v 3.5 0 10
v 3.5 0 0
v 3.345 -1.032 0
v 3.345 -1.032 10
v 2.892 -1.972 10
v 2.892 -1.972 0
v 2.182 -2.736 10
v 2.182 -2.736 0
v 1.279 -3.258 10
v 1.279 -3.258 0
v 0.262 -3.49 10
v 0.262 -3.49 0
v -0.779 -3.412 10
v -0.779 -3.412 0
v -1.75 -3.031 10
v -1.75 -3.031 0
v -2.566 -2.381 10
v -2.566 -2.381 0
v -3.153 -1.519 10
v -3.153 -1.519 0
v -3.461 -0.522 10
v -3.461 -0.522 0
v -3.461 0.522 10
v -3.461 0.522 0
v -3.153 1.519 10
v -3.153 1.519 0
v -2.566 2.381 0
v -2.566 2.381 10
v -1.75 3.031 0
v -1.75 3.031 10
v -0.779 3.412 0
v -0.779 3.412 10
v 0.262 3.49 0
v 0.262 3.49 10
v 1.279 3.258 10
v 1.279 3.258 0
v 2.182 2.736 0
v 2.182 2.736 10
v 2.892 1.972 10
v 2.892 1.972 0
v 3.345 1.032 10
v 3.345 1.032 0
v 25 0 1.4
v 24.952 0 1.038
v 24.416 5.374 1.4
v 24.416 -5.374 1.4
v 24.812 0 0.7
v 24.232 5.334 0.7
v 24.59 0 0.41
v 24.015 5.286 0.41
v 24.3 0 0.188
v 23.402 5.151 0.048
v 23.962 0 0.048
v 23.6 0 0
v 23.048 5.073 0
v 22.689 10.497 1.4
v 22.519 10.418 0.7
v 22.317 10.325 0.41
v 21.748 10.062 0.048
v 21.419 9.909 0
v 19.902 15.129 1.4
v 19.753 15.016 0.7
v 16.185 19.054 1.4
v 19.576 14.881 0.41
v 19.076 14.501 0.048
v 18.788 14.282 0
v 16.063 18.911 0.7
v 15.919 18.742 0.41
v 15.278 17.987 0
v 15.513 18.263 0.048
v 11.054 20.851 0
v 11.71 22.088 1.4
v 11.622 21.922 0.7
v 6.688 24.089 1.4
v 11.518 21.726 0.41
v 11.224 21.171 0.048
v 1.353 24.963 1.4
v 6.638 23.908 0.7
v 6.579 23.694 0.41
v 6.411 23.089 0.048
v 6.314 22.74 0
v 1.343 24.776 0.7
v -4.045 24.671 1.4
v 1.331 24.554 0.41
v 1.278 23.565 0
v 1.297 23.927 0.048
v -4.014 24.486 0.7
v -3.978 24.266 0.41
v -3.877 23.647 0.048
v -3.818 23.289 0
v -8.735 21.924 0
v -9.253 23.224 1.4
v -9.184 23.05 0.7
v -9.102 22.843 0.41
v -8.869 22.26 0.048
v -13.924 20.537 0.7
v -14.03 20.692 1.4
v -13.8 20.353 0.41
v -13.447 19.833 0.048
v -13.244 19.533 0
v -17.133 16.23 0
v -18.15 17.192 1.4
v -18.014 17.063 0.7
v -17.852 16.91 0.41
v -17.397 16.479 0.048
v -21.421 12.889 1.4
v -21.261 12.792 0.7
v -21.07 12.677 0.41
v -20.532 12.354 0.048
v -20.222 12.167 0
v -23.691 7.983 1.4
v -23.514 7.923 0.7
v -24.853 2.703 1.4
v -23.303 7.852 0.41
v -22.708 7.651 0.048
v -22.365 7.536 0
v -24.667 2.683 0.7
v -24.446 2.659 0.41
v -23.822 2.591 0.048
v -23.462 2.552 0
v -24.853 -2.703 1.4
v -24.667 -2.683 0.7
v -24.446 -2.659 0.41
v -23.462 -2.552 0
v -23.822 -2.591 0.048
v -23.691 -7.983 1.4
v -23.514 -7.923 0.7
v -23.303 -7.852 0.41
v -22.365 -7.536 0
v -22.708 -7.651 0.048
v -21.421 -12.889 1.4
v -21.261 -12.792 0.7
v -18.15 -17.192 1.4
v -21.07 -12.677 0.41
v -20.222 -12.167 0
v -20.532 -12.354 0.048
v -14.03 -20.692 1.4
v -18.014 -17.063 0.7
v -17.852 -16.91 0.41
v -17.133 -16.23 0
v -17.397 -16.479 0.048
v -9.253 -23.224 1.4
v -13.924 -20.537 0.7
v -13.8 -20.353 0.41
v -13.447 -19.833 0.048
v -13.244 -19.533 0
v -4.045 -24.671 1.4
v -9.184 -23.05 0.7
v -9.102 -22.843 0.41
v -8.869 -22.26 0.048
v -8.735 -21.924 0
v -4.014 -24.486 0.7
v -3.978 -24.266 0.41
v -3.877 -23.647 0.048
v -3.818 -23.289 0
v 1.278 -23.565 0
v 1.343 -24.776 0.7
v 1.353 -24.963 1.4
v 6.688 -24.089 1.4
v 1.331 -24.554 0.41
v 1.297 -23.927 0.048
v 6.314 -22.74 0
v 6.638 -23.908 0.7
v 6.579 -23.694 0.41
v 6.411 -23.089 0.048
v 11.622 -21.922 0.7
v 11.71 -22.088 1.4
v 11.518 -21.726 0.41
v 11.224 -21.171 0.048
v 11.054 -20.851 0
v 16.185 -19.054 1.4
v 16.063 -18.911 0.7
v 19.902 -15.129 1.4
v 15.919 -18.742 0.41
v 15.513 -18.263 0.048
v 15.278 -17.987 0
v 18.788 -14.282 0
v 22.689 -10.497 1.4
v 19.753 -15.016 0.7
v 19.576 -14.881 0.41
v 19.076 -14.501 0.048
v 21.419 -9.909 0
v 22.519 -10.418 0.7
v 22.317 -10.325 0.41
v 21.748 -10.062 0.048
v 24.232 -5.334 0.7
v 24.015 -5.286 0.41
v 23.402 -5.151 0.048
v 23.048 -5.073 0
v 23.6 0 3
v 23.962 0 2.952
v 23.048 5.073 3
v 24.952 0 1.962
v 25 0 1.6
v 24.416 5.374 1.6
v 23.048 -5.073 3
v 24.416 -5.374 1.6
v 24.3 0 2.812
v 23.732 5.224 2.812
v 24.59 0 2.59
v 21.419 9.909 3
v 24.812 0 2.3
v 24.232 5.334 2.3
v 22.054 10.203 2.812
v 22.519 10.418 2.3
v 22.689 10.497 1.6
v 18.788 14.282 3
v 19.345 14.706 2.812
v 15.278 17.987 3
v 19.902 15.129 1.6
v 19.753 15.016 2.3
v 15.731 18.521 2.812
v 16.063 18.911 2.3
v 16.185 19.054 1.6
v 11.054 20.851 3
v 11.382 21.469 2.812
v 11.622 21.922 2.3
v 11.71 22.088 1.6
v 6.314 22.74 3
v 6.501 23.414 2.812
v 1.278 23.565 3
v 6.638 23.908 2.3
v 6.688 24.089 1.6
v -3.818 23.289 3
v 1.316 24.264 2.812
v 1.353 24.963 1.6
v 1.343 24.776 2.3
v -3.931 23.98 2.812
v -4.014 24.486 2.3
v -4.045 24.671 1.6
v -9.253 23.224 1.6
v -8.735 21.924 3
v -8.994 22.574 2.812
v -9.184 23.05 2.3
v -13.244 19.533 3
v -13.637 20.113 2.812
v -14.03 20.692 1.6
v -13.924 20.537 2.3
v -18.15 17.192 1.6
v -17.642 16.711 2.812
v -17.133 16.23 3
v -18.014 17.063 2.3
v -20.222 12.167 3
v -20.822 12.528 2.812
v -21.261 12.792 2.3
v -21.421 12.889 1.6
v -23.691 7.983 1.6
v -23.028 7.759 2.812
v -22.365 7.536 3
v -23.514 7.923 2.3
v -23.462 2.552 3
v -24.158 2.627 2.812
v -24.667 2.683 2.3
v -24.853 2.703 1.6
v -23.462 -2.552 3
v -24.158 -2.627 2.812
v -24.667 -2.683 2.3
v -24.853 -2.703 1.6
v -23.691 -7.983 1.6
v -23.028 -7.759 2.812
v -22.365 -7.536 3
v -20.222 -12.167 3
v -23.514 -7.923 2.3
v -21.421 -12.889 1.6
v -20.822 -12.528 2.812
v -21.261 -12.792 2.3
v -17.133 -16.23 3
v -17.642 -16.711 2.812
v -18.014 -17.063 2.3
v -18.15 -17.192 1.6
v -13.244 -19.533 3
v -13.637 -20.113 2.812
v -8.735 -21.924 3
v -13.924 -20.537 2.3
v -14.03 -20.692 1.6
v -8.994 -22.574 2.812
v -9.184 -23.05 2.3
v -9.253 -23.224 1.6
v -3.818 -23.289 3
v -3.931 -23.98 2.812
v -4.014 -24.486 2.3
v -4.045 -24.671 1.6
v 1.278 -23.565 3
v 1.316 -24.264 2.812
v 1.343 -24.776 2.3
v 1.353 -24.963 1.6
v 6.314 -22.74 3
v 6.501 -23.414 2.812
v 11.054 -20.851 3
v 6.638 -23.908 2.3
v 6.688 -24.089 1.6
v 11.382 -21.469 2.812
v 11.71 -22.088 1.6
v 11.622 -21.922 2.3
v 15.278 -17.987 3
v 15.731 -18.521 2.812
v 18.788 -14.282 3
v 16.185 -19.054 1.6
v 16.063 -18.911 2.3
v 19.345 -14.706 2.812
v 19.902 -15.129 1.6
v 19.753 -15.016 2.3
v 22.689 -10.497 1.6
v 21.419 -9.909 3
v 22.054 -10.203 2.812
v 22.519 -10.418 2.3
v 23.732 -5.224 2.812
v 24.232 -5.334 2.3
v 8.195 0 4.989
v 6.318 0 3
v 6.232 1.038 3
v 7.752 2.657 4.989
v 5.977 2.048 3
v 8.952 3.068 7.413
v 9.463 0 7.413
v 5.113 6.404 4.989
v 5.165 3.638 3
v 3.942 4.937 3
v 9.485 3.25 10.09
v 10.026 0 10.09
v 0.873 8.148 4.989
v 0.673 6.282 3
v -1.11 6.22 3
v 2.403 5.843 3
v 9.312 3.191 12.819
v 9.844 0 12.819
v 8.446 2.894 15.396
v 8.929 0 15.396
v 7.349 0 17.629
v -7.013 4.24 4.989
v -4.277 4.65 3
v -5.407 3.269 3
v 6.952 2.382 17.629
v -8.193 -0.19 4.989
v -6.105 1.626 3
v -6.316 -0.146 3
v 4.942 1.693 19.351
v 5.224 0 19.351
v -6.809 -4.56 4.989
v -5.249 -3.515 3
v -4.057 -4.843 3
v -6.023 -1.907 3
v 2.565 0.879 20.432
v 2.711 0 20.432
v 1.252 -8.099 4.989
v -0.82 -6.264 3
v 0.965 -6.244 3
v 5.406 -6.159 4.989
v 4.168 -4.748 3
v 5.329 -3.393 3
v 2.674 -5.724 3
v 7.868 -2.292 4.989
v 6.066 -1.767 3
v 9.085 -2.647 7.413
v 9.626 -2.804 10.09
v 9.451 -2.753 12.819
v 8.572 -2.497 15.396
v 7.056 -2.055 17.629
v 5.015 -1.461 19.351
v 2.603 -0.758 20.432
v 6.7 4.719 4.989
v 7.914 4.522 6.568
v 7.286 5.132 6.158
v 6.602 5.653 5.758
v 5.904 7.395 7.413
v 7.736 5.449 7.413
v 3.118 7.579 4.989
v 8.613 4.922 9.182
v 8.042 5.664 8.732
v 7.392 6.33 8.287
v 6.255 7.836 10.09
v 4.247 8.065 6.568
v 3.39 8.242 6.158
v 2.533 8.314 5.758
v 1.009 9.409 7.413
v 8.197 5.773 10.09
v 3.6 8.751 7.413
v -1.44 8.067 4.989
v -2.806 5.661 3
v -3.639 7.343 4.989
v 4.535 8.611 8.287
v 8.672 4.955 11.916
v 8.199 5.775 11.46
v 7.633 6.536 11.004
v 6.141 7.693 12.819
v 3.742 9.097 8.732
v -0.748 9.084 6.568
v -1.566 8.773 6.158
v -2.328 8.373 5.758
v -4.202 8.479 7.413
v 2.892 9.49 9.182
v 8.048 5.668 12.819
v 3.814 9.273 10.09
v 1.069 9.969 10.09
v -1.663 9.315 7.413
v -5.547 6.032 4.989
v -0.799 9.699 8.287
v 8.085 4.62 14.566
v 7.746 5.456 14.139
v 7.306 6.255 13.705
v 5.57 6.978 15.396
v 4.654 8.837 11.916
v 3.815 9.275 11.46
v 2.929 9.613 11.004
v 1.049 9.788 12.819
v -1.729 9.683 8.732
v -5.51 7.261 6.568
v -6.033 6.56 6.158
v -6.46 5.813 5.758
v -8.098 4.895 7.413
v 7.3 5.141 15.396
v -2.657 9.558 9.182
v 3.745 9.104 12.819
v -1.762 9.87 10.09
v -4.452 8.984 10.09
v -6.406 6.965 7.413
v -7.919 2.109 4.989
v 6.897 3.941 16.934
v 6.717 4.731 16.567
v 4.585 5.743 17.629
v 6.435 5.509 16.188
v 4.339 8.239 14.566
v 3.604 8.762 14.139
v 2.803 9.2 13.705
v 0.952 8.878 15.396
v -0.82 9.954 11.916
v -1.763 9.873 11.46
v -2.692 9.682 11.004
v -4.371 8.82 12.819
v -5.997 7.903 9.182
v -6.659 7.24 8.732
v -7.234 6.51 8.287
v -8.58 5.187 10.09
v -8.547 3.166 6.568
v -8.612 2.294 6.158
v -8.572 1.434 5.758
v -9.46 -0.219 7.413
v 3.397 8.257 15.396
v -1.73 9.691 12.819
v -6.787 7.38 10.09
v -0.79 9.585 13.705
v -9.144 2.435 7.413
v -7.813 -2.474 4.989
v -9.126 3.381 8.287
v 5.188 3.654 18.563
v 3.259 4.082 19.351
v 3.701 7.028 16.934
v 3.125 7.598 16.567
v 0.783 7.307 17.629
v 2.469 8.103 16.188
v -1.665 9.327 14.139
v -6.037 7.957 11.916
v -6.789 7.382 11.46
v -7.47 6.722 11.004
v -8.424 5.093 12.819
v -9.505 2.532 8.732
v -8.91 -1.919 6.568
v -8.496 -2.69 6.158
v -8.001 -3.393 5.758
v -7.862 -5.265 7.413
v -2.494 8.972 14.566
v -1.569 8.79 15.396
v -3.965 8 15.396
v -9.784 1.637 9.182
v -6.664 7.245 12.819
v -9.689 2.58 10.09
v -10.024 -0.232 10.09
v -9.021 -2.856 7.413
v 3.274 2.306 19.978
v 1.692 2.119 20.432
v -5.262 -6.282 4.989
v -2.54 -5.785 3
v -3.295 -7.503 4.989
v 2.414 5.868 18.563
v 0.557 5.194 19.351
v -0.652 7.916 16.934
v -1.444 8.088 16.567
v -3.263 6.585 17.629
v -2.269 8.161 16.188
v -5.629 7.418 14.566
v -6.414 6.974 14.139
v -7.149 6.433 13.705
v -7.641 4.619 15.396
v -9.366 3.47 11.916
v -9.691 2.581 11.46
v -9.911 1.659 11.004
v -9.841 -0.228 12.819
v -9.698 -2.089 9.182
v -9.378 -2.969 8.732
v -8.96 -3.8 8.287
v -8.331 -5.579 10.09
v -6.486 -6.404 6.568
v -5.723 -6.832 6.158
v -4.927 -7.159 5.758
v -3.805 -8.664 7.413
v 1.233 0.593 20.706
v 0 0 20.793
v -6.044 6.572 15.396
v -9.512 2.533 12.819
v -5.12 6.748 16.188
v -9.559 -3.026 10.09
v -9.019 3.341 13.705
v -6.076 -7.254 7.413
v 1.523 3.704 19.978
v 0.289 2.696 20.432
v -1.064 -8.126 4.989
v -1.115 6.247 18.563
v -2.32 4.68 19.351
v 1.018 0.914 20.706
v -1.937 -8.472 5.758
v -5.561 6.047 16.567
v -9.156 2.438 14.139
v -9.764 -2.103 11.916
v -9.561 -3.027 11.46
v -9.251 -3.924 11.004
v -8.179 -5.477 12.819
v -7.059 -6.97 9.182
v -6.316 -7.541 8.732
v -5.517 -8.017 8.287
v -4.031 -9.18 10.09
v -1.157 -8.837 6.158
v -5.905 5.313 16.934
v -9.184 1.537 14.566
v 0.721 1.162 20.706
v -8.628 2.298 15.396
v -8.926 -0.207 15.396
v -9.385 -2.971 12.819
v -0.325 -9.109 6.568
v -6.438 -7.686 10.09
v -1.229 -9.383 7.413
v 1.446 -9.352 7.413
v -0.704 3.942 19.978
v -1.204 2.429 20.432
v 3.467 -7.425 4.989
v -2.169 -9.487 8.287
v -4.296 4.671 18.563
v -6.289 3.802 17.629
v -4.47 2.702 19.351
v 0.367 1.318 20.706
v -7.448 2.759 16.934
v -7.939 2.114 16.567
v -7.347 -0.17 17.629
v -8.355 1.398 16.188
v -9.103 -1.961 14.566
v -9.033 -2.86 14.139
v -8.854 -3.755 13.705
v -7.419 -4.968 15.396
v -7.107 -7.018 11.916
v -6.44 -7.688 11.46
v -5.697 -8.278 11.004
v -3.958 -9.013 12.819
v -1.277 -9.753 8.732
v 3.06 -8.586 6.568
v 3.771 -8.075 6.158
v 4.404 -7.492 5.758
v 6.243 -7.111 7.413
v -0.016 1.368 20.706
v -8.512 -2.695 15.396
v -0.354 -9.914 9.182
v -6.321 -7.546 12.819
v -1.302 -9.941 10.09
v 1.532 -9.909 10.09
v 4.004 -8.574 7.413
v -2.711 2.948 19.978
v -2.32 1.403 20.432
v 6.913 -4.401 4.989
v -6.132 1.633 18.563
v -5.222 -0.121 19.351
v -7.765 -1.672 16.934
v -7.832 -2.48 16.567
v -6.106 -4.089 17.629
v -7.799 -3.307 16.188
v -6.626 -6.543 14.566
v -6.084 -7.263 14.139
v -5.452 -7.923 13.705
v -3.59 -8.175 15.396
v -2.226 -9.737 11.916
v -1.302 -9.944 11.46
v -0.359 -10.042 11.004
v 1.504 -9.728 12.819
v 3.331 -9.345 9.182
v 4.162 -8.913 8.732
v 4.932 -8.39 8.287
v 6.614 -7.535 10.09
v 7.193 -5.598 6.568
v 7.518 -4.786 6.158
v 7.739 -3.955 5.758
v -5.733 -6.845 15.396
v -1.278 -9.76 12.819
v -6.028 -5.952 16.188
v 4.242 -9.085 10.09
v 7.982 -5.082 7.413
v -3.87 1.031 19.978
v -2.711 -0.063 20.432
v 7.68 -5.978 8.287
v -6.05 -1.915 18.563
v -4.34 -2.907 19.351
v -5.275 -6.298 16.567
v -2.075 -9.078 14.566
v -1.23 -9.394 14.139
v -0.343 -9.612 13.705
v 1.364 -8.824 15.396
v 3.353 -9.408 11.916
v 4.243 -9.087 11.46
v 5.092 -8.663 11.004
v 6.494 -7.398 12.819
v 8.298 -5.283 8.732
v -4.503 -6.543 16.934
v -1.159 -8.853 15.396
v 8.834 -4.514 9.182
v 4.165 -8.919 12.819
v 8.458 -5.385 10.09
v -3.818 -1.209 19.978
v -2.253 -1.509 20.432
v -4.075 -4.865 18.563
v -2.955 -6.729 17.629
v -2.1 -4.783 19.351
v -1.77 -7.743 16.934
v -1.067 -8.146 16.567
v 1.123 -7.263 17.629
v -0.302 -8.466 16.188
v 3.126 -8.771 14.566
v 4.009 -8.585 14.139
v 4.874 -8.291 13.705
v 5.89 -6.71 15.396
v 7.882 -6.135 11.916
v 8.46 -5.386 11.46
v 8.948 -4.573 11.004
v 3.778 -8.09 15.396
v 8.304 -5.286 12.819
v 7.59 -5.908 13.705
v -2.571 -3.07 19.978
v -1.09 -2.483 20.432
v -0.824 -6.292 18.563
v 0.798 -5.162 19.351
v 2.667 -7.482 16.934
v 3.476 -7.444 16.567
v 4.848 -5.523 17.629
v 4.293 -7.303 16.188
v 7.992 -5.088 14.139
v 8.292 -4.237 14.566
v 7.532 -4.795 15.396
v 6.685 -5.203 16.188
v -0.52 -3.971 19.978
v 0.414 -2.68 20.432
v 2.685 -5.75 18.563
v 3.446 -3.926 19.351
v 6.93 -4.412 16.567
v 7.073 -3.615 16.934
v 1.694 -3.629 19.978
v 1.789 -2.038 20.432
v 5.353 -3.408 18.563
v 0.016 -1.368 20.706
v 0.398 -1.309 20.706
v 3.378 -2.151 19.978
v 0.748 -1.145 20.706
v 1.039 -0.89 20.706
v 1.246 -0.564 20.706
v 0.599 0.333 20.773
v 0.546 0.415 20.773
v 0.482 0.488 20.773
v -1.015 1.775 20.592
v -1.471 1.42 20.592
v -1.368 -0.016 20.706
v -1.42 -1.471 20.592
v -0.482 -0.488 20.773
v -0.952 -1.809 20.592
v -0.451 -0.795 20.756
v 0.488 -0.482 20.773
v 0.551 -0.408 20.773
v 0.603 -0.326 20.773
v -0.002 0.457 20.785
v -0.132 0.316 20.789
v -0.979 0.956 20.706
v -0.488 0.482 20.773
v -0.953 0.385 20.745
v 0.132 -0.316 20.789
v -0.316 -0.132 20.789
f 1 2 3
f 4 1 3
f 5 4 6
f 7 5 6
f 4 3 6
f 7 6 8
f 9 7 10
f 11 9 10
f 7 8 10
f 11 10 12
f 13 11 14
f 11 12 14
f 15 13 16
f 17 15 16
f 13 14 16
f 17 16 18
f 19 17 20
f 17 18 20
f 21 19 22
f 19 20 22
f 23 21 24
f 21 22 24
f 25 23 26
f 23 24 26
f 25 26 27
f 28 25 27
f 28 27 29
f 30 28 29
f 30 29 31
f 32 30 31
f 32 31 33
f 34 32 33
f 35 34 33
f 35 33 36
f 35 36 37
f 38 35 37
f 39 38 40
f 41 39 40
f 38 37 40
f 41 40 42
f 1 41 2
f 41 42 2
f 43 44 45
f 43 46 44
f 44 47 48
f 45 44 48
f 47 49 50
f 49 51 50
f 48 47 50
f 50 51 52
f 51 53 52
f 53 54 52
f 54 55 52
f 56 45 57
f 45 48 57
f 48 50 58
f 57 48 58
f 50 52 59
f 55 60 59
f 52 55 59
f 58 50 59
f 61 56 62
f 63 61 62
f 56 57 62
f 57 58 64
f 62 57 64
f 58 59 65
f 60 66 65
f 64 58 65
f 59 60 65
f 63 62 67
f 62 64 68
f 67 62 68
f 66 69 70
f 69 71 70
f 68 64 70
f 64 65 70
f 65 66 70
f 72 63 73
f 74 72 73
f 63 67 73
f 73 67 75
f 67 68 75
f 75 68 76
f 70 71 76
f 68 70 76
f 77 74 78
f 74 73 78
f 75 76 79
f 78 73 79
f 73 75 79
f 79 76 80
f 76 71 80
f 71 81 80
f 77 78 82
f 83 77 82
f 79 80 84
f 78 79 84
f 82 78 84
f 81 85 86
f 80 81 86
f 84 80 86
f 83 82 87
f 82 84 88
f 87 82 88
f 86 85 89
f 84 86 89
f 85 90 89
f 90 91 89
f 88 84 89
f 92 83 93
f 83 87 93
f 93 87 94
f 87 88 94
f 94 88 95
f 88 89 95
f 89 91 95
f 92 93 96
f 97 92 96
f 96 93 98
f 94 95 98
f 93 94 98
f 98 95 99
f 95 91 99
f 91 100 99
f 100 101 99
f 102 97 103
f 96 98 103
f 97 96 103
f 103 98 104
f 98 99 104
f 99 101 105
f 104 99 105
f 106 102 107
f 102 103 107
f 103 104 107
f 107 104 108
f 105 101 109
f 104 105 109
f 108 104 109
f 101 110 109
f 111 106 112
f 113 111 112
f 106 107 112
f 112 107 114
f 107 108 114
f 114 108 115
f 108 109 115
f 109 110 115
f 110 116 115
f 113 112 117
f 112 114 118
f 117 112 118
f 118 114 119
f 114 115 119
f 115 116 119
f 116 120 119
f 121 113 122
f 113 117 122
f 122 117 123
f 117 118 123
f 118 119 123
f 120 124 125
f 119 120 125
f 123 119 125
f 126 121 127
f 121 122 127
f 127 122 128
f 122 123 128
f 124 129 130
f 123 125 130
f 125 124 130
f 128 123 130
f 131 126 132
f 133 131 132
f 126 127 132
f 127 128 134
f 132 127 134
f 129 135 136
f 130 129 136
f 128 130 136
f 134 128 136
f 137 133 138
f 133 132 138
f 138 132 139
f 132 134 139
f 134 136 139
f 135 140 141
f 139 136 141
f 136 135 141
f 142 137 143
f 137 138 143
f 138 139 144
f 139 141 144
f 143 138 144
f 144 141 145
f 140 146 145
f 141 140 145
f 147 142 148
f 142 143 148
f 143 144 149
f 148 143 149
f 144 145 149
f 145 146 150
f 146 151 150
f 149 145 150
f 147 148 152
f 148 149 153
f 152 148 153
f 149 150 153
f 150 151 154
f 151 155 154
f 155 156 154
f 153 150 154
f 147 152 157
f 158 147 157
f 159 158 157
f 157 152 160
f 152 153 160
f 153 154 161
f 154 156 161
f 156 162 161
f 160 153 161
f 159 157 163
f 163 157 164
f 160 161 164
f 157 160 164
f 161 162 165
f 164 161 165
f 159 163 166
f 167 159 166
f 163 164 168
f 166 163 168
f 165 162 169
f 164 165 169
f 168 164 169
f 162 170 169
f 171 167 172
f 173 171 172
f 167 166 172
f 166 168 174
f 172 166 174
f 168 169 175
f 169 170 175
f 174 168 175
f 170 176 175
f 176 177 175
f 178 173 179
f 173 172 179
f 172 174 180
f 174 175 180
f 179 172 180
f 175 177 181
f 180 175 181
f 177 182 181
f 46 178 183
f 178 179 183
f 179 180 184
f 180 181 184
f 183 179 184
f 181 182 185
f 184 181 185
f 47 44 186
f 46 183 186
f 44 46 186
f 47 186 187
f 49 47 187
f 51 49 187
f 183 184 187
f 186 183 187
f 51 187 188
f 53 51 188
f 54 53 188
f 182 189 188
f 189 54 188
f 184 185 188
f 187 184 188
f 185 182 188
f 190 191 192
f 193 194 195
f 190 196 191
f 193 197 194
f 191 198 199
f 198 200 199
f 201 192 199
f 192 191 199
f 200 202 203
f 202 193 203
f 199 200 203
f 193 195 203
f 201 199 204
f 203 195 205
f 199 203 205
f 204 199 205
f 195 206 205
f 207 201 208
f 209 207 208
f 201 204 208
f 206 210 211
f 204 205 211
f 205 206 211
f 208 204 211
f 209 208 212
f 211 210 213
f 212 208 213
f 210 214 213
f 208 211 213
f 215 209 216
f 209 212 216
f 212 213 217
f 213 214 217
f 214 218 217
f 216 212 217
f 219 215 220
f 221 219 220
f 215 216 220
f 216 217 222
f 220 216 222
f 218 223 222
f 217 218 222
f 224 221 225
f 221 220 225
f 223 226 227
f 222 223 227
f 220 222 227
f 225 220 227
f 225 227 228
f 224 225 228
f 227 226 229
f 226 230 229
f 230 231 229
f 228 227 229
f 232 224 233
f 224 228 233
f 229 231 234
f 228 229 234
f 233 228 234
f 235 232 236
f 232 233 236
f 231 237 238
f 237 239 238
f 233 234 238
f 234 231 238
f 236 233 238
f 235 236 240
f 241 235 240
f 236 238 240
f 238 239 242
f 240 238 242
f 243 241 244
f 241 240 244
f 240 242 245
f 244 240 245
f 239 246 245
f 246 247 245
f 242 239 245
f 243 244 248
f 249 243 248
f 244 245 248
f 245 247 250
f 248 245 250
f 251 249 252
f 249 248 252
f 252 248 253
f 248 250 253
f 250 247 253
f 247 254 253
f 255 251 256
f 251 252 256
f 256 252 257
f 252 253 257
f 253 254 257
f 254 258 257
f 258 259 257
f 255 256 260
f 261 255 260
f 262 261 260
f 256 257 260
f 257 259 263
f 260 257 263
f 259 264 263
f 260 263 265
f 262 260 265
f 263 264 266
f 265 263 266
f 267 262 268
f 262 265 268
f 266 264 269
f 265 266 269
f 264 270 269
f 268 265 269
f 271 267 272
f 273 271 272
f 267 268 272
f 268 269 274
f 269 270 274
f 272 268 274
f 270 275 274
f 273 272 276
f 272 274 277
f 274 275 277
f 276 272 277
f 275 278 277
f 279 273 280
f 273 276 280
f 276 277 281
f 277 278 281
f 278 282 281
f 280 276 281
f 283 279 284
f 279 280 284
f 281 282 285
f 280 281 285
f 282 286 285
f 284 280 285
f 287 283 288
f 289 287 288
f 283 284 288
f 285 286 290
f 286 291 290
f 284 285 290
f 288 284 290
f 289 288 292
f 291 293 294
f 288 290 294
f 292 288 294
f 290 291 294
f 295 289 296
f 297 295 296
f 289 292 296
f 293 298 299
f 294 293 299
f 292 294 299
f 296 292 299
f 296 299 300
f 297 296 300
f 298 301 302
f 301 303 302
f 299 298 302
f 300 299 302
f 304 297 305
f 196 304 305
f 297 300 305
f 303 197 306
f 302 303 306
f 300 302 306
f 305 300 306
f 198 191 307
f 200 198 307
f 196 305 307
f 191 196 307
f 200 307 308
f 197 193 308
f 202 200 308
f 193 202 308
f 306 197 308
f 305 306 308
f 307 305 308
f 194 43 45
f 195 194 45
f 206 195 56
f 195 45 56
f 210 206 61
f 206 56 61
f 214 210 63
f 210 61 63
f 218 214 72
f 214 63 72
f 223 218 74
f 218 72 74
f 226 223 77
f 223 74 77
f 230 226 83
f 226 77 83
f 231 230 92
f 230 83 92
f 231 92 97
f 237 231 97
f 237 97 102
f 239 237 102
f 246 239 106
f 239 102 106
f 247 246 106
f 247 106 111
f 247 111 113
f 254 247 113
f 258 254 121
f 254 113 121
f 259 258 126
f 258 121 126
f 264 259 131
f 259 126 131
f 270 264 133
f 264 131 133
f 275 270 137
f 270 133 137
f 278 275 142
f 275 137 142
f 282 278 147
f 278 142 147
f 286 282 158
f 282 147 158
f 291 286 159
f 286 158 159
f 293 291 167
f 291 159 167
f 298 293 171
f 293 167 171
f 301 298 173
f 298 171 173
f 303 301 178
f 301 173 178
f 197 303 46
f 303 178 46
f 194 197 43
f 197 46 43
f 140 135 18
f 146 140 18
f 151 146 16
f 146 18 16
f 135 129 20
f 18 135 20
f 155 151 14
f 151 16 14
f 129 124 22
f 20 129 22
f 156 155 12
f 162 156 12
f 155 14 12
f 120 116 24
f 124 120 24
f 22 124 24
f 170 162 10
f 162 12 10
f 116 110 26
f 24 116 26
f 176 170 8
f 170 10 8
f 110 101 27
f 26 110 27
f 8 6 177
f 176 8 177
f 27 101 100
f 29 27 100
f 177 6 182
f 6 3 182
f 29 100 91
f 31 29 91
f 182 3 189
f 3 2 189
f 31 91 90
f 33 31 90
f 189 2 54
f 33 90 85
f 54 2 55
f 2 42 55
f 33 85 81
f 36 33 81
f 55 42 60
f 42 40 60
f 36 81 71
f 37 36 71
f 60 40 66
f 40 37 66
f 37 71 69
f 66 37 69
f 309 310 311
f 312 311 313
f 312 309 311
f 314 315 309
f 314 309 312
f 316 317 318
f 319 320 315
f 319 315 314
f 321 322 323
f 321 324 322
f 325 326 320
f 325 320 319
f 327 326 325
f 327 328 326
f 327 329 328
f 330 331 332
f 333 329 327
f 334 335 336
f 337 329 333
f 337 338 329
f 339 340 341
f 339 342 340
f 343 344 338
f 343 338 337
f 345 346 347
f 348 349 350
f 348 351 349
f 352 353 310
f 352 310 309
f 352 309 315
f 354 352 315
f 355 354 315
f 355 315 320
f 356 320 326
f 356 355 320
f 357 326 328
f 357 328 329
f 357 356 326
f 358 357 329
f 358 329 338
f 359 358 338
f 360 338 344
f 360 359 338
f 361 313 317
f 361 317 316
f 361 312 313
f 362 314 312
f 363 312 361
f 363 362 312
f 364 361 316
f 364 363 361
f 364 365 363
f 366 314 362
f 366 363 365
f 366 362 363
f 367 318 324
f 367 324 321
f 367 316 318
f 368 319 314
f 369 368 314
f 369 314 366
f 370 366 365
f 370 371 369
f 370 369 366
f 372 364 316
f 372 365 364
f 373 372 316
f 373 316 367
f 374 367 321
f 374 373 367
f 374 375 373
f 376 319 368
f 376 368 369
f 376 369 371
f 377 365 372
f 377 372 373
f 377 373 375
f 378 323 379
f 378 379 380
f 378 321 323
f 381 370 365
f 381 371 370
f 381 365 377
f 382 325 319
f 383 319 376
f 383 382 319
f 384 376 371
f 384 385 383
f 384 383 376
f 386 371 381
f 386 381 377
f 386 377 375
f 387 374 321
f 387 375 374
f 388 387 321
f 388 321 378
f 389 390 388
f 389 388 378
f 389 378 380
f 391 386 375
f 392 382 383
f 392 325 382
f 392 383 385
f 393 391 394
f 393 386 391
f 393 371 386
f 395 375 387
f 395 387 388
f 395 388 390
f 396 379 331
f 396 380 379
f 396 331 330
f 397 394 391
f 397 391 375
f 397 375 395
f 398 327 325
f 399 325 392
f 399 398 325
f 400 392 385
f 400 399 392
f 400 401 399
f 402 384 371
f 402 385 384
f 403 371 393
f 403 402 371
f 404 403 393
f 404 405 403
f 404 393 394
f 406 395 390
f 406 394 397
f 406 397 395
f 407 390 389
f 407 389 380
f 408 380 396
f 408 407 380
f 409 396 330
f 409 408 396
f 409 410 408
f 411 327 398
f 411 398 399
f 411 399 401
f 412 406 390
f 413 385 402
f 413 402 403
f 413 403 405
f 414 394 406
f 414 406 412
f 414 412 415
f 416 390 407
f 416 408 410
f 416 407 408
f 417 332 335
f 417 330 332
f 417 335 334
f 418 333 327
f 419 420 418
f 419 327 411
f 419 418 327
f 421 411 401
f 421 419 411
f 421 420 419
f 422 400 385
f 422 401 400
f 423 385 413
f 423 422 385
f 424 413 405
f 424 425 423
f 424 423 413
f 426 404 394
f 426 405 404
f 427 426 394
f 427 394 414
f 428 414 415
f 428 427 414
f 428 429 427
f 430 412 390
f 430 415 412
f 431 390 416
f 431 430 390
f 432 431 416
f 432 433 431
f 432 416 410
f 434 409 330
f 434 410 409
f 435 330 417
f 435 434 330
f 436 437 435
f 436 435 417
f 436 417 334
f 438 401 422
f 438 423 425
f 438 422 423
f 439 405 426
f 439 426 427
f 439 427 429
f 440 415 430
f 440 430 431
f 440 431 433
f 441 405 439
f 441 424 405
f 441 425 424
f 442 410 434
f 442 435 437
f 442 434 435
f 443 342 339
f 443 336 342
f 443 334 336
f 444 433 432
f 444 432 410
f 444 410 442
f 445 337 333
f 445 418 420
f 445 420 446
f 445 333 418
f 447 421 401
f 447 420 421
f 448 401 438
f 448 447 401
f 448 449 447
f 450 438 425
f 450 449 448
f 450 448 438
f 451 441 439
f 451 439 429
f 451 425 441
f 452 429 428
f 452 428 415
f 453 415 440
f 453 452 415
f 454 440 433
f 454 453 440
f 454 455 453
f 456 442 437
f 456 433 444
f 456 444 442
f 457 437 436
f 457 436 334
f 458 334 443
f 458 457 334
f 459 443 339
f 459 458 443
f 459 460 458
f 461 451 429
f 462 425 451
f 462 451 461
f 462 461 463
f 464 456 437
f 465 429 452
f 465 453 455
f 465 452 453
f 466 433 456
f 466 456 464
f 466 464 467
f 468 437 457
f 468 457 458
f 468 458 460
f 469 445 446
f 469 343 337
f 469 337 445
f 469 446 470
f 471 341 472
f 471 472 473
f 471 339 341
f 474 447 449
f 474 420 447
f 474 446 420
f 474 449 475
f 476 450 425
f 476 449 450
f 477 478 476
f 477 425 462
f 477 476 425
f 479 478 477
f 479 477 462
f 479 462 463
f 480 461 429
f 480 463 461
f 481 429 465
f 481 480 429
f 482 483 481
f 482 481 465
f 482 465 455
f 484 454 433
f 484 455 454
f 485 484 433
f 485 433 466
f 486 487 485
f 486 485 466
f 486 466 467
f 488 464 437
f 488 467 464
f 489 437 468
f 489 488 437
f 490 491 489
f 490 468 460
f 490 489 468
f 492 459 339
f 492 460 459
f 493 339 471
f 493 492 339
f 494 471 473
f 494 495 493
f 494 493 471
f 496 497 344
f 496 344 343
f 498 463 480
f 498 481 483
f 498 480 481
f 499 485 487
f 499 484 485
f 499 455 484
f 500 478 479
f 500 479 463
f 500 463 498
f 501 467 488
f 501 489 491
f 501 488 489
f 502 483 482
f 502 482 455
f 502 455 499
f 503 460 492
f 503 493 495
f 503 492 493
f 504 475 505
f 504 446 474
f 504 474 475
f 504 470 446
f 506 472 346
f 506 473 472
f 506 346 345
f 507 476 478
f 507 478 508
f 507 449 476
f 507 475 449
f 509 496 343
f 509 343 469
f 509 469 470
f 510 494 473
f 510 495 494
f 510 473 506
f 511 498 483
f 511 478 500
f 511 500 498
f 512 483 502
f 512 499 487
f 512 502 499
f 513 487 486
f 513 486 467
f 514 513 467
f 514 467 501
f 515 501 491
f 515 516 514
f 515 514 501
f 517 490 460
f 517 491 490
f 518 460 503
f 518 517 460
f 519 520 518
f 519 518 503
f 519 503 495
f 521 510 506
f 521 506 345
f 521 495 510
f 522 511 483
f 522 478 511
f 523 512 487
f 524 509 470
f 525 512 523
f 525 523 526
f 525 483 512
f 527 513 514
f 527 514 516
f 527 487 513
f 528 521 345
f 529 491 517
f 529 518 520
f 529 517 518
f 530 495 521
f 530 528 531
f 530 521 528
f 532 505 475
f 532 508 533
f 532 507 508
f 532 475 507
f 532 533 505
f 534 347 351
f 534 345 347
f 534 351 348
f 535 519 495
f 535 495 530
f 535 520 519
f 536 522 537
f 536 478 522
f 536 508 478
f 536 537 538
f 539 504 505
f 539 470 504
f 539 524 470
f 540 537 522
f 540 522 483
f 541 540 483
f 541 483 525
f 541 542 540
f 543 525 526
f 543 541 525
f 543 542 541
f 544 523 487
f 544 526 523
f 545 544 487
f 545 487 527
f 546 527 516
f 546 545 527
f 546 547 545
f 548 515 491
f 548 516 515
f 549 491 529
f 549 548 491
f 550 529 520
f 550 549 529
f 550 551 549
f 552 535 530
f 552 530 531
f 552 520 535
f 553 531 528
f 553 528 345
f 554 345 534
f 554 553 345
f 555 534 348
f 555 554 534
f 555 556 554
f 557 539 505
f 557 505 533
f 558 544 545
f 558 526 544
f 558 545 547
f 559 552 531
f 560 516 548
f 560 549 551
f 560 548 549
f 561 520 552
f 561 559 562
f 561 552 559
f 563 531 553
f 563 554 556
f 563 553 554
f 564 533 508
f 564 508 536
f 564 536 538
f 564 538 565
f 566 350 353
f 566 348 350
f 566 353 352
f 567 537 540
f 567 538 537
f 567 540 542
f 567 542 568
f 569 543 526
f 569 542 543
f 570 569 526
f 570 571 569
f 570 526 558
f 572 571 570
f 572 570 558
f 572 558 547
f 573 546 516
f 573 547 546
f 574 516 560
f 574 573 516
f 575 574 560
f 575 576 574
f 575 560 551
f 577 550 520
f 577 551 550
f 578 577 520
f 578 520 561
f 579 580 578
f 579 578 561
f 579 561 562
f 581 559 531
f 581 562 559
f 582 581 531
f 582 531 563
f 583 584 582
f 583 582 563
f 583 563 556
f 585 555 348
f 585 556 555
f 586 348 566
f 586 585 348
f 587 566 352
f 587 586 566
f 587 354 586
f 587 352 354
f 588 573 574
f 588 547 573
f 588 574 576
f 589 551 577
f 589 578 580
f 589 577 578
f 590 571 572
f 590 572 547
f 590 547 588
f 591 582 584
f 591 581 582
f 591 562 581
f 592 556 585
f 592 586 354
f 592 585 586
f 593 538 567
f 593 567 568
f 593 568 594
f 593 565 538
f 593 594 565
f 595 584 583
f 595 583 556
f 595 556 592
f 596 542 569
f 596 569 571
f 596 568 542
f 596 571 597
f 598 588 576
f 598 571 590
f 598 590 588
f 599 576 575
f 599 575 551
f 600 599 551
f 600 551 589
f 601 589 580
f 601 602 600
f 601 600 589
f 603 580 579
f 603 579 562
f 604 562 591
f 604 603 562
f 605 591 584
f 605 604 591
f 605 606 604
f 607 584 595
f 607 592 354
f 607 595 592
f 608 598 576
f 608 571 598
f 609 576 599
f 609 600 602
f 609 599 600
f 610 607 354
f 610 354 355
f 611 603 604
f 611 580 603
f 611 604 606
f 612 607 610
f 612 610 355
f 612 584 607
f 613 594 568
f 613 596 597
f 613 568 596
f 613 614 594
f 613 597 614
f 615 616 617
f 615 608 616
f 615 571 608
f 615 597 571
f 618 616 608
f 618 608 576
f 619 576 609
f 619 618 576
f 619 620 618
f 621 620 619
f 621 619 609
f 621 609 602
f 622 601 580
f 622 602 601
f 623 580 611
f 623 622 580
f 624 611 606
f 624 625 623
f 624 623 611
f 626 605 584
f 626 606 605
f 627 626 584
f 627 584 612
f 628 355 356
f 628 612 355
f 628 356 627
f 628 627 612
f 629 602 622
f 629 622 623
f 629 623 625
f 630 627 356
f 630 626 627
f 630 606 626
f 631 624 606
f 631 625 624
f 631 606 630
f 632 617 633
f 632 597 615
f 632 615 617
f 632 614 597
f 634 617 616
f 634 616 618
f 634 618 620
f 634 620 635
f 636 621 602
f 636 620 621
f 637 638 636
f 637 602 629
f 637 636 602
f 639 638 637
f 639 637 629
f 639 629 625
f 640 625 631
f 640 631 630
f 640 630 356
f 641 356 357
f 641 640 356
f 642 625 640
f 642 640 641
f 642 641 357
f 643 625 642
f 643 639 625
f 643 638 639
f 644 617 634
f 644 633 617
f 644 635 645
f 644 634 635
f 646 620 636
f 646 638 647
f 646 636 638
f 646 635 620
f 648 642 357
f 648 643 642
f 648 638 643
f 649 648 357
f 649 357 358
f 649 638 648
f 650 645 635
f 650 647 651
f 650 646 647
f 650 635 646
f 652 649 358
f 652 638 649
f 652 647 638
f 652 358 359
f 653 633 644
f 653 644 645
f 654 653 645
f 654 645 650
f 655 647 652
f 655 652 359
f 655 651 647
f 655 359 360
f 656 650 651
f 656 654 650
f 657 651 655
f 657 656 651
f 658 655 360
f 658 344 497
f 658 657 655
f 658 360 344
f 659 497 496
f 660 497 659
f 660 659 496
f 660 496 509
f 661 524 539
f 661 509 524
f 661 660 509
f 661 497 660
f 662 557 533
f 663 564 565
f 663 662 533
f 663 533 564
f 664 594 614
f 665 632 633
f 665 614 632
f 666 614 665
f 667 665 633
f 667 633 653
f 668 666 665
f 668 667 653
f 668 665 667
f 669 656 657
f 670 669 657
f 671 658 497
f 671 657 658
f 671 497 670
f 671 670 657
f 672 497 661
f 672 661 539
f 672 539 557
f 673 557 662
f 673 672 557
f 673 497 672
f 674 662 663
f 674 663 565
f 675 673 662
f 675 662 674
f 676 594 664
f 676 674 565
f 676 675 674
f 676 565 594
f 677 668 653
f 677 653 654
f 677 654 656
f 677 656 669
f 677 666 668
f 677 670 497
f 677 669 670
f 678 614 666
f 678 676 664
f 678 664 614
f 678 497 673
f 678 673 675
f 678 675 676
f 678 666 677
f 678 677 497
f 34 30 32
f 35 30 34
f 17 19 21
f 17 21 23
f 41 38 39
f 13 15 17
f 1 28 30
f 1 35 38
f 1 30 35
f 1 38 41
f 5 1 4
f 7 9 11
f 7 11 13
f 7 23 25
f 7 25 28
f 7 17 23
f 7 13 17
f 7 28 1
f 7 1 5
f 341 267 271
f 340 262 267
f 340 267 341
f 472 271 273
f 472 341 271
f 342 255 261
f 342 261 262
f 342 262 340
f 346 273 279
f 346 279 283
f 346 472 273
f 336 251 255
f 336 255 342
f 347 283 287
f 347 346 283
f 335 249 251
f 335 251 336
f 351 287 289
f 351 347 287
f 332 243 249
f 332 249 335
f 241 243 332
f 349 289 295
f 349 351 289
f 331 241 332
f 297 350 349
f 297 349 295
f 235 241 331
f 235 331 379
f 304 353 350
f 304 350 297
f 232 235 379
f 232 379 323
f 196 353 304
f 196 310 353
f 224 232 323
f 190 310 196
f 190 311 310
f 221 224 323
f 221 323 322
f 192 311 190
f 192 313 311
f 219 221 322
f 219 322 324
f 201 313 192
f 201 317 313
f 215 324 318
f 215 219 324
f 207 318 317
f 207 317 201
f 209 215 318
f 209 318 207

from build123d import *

# Parameters (mm, degrees)
F0_R     = 25
F1_DEPTH = 3
F4_R     = 1.4
F5_R     = 3.5
F6_DEPTH = 10


with BuildPart() as f1:
    # F0 (on Top) → F1 (new body)
    with BuildSketch(Plane.XY):
        Circle(F0_R)
    extrude(amount=F1_DEPTH)

    # F2 (on Front) → F3 (revolve)
    with BuildSketch(Plane.XZ):
        with BuildLine():
            Line((0, 10.14882), (0, 0.792952))
            ThreePointArc((0, 0.792952), (10.051117, 10.792821), (0, 20.792691))
            Line((0, 20.792691), (0, 10.14882))
        make_face()
    revolve(axis=Axis((0, 0, 5.470886), (0, 0, 1)))

    # F4
    f4_edges = [f1.edges().sort_by_distance(p)[0] for p in [
        (-25, 0, 0),
        (-25, 0, 3),
    ]]
    fillet(f4_edges, radius=F4_R)

    # F5 (on face) → F6 (cut)
    with BuildSketch(Plane(origin=(0, 0, 0), x_dir=(1, 0, 0), z_dir=(0, 0, -1))):
        Circle(F5_R)
    extrude(amount=-F6_DEPTH, mode=Mode.SUBTRACT)


solid = f1.part
